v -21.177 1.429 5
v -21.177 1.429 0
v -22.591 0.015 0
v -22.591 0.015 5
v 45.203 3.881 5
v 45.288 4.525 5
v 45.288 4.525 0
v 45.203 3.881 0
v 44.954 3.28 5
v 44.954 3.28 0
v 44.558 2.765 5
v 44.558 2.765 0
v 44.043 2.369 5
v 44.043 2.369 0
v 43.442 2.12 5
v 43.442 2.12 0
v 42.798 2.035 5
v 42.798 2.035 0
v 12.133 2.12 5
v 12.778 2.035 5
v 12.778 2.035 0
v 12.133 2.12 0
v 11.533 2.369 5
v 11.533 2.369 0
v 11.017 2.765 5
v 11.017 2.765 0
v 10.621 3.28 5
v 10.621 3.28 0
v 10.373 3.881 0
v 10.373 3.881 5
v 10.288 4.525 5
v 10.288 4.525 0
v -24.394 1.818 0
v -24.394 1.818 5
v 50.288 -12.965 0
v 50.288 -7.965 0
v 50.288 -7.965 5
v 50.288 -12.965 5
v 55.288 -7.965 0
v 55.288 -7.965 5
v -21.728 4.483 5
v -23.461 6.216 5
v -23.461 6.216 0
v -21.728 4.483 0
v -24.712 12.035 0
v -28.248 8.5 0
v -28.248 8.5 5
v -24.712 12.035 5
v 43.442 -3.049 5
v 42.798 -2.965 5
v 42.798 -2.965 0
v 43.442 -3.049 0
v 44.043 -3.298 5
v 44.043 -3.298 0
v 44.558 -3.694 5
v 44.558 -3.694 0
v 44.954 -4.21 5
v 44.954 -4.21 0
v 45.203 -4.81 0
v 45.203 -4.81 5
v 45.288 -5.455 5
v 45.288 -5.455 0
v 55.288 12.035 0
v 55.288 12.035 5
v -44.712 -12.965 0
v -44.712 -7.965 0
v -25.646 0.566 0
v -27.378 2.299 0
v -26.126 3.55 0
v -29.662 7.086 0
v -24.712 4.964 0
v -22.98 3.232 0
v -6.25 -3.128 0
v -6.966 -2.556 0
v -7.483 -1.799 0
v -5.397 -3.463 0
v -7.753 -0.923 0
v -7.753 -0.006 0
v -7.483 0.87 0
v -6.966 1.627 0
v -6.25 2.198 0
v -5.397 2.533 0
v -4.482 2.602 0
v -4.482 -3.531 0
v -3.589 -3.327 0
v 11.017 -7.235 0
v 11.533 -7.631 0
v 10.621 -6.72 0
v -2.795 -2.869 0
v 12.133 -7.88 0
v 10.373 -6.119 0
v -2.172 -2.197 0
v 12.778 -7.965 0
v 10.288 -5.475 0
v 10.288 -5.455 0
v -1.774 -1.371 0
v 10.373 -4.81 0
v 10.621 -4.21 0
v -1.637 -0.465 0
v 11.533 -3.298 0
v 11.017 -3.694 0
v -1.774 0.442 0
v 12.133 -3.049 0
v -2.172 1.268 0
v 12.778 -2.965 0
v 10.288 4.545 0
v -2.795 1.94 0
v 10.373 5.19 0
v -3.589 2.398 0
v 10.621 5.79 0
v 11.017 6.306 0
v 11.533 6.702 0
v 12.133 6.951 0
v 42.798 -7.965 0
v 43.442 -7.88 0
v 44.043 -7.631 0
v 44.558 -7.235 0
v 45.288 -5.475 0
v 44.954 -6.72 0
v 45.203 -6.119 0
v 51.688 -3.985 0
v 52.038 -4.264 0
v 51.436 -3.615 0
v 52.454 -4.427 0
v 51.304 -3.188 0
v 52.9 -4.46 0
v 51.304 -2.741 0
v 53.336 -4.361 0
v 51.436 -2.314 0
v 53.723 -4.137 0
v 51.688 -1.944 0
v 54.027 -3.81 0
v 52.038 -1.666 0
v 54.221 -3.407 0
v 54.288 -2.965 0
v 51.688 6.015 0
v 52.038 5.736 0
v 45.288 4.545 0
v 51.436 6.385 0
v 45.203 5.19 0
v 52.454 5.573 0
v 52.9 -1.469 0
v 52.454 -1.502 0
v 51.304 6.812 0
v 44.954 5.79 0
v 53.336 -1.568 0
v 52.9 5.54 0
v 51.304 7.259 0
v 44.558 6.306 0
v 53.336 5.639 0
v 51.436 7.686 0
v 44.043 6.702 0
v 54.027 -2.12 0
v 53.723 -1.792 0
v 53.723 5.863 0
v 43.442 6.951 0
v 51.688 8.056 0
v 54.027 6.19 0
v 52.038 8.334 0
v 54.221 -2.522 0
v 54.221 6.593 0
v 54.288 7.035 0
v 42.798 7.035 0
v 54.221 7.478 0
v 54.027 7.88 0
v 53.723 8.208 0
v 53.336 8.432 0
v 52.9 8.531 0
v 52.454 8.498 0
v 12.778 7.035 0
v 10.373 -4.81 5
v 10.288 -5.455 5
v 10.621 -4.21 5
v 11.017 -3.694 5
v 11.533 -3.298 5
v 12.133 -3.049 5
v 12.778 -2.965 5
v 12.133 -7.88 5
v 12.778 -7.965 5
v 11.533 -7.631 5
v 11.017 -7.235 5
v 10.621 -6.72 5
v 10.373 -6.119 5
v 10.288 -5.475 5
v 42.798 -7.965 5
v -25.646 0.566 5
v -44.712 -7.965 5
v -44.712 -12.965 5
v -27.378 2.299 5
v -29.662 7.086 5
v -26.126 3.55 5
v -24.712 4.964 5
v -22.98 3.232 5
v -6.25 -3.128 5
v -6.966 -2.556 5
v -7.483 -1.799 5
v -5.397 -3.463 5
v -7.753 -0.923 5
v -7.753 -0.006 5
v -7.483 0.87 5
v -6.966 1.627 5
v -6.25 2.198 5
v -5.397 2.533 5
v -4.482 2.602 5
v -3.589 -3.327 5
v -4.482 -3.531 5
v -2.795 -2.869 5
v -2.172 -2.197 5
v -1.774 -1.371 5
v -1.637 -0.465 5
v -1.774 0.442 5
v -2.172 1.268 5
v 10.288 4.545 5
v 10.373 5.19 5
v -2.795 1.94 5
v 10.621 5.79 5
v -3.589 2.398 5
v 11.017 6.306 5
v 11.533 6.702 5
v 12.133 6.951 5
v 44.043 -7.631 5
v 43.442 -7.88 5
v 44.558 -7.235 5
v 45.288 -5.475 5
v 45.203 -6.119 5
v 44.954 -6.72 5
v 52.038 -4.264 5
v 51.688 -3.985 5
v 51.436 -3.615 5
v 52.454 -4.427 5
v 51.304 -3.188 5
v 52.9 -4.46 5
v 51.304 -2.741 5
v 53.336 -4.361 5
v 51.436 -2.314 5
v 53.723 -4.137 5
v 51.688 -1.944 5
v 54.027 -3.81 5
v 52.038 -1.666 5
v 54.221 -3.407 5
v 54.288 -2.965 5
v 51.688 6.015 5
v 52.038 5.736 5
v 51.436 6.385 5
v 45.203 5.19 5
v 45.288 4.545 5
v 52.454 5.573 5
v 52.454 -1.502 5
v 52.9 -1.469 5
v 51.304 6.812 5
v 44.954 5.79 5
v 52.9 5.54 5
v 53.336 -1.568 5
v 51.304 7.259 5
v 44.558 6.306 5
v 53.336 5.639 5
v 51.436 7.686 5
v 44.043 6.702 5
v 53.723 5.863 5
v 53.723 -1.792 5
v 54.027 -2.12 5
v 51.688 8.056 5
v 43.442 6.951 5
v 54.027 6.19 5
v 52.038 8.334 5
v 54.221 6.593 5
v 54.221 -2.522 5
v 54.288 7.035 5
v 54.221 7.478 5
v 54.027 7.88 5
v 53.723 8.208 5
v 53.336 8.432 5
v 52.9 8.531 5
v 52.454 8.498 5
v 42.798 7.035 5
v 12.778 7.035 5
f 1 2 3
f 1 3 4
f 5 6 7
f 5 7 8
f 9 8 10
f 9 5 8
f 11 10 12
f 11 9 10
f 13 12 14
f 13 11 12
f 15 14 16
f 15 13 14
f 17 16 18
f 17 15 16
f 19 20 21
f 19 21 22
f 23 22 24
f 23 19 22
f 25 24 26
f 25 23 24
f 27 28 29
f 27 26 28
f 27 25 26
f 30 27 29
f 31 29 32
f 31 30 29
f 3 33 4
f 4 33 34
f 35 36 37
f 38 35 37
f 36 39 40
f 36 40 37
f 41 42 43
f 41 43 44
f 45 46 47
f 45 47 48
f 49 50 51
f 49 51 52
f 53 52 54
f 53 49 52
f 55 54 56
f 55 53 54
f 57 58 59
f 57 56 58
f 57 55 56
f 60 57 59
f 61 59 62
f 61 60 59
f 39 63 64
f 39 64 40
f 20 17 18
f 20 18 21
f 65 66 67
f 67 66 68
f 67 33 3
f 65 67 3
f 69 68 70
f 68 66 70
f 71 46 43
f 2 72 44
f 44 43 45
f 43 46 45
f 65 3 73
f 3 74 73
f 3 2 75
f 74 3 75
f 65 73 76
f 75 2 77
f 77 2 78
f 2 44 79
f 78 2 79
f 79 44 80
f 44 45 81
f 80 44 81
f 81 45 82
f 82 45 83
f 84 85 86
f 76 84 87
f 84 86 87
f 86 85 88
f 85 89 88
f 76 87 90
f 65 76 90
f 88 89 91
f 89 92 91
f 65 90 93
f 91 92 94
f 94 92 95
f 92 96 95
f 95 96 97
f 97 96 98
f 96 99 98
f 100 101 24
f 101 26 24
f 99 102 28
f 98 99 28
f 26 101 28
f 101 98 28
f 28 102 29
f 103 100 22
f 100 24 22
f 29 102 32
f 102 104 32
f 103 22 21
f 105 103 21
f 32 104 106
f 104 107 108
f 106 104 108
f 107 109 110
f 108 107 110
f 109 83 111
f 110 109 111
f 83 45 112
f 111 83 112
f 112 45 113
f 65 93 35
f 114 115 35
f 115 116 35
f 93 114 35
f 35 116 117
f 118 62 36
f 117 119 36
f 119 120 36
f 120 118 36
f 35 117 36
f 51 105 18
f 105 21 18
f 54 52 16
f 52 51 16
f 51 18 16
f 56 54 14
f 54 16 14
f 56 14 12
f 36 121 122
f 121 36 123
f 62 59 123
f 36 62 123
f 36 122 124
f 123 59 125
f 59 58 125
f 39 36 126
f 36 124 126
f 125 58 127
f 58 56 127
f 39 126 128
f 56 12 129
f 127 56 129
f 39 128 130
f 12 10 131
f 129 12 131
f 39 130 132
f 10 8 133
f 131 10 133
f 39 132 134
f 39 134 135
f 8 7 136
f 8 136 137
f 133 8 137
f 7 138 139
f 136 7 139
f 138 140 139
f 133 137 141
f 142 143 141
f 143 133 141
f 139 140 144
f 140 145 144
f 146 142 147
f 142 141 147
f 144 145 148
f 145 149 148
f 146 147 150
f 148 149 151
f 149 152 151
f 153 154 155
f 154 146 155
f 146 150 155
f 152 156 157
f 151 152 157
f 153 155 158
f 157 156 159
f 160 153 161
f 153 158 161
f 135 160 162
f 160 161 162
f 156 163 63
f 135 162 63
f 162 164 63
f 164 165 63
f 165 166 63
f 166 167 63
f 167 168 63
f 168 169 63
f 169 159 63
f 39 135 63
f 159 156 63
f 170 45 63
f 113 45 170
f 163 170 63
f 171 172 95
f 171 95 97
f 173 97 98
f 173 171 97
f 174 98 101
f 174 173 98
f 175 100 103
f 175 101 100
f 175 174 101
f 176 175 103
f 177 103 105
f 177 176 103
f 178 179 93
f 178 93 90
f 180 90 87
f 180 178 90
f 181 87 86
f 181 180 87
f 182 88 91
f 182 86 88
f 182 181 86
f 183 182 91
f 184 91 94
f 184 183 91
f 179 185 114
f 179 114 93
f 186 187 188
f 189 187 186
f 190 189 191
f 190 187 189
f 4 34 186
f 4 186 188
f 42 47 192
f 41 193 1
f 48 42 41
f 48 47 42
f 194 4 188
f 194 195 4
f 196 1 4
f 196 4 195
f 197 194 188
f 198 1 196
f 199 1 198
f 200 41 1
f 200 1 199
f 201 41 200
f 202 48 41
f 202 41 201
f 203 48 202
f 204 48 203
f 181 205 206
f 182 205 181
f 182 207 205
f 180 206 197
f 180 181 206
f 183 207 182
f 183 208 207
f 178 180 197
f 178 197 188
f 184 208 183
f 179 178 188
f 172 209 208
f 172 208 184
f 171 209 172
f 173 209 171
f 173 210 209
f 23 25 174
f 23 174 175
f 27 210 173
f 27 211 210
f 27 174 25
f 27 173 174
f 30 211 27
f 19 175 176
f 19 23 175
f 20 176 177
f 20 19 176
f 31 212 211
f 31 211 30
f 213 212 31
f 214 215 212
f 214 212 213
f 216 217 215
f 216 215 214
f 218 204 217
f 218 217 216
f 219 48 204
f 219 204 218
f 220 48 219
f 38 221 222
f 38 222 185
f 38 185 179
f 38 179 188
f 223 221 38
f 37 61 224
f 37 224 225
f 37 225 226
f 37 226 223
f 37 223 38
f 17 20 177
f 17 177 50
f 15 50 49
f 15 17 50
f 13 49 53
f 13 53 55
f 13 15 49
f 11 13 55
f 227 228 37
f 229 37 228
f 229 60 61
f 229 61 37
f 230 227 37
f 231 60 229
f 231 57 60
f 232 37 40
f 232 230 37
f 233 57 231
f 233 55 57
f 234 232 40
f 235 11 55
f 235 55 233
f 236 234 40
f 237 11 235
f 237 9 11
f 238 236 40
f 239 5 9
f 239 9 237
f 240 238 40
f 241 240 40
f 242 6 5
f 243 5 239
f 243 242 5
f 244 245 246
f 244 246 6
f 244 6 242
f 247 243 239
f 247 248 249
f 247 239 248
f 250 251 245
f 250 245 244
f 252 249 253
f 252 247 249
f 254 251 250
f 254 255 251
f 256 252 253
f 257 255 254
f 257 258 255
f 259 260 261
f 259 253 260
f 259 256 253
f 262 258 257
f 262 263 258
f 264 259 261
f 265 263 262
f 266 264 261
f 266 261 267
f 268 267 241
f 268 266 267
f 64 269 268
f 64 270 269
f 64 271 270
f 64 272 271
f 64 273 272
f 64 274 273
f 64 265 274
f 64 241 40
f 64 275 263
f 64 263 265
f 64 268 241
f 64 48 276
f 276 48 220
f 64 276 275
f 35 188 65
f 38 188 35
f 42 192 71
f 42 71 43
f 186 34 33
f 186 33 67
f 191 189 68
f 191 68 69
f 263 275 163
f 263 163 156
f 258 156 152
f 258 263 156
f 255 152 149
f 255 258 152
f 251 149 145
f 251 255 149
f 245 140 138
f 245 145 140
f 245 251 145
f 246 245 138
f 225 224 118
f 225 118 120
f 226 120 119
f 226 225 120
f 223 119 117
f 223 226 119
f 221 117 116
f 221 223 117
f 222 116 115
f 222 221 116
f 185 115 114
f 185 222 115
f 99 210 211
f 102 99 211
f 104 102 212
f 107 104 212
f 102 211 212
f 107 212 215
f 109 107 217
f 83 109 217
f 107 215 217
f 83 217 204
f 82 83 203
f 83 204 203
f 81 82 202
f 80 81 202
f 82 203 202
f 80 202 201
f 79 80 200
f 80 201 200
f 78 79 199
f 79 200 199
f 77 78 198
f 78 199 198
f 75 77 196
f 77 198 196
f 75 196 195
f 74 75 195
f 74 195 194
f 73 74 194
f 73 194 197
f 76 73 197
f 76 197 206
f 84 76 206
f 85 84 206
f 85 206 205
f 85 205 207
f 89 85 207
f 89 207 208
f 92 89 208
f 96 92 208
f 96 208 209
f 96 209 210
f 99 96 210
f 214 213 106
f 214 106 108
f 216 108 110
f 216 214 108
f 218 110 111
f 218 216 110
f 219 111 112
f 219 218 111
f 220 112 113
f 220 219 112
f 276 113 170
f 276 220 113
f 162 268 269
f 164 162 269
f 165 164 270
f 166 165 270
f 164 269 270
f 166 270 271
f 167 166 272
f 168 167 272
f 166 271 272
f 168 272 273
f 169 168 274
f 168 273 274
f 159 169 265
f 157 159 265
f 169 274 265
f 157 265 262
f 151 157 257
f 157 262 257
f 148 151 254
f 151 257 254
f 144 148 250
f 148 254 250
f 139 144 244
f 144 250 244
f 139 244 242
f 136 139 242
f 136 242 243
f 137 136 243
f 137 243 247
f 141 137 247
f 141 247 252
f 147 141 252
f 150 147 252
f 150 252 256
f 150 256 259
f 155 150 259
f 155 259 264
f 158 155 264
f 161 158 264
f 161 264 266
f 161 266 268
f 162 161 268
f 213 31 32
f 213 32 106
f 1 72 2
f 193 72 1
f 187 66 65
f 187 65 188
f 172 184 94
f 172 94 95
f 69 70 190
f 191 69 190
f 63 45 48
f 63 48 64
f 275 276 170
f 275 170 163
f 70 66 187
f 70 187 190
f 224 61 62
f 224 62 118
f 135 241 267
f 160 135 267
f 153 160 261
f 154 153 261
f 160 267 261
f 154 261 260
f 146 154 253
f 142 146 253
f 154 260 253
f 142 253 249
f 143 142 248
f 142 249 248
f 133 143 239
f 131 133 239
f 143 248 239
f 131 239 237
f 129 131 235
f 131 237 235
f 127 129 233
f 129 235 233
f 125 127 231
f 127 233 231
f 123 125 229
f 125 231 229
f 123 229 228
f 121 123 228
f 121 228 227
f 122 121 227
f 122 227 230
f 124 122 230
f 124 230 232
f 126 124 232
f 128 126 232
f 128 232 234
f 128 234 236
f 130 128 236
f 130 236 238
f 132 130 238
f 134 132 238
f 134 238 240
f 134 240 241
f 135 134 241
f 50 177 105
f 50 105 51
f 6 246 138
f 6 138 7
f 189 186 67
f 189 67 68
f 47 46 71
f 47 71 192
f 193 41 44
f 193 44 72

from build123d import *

# Parameters (mm, degrees)
RESSALTO_EXTRUS_O1_DEPTH = 5
ESBO_O2_W                = 95
ESBO_O2_H                = 5
RESSALTO_EXTRUS_O2_DEPTH = 5
ESBO_O5_W                = 5
ESBO_O5_H                = 2
CORTE_EXTRUS_O1_DEPTH    = 10
CORTE_EXTRUS_O2_DEPTH    = 10
ESBO_O8_R                = 3.075
CORTE_EXTRUS_O3_DEPTH    = 6
CORTE_EXTRUS_O4_DEPTH    = 10
ESBO_O10_R               = 1.5
CORTE_EXTRUS_O5_DEPTH    = 10


with BuildPart() as part:
    # Esboço1 → Ressalto-extrusão1 (new body)
    with BuildSketch(Plane.XY):
        Polygon((-44.712278576, -7.96460177), (-24.712278576, 12.03539823), (55.287721424, 12.03539823), (55.287721424, -7.96460177), align=None)
    extrude(amount=RESSALTO_EXTRUS_O1_DEPTH)

    # Esboço2 → Ressalto-extrusão2 (add)
    with BuildSketch(Plane.XZ.offset(7.96460177)):
        with Locations((2.787721424, 2.5)):
            Rectangle(ESBO_O2_W, ESBO_O2_H)
    extrude(amount=RESSALTO_EXTRUS_O2_DEPTH)

    # Esboço5 → Corte-extrusão1 (cut)
    with BuildSketch(Plane(origin=(-18.373838403, 18.373838403, 0), x_dir=(0, 0, 1), z_dir=(-0.707106781, 0.707106781, 0))):
        with Locations((2.5, -14.963908057)):
            Rectangle(ESBO_O5_W, ESBO_O5_H)
    extrude(amount=-CORTE_EXTRUS_O1_DEPTH, mode=Mode.SUBTRACT)

    # Esboço7 → Corte-extrusão2 (cut)
    with BuildSketch(Plane.XY.offset(5)):
        Polygon((-24.712278576, 4.964330418), (-23.460699574, 6.215909421), (-21.72828796, 4.483497807), (-22.979866962, 3.231918804), align=None)
        Polygon((-24.394080525, 1.817705242), (-25.645659528, 0.566126239), (-27.378071141, 2.298537853), (-26.126492139, 3.550116856), align=None)
    extrude(amount=-CORTE_EXTRUS_O2_DEPTH, mode=Mode.SUBTRACT)

    # Esboço8 → Corte-extrusão3 (cut, through all)
    with BuildSketch(Plane.XY.offset(5)):
        with Locations((-4.712278576, -0.46460177)):
            Circle(ESBO_O8_R)
    extrude(amount=-CORTE_EXTRUS_O3_DEPTH, mode=Mode.SUBTRACT)

    # Esboço9 → Corte-extrusão4 (cut)
    with BuildSketch(Plane.XY.offset(5)):
        with BuildLine():
            Line((12.777721424, 7.03539823), (42.797721424, 7.03539823))
            ThreePointArc((42.797721424, 7.03539823), (44.558417309, 6.306094115), (45.287721424, 4.54539823))
            Line((45.287721424, 4.54539823), (45.287721424, 4.52539823))
            ThreePointArc((45.287721424, 4.52539823), (44.558417309, 2.764702345), (42.797721424, 2.03539823))
            Line((42.797721424, 2.03539823), (12.777721424, 2.03539823))
            ThreePointArc((12.777721424, 2.03539823), (11.017025538, 2.764702345), (10.287721424, 4.52539823))
            Line((10.287721424, 4.52539823), (10.287721424, 4.54539823))
            ThreePointArc((10.287721424, 4.54539823), (11.017025538, 6.306094115), (12.777721424, 7.03539823))
        make_face()
        with BuildLine():
            Line((12.777721424, -2.96460177), (42.797721424, -2.96460177))
            ThreePointArc((42.797721424, -2.96460177), (44.558417309, -3.693905885), (45.287721424, -5.45460177))
            Line((45.287721424, -5.45460177), (45.287721424, -5.47460177))
            ThreePointArc((45.287721424, -5.47460177), (44.558417309, -7.235297655), (42.797721424, -7.96460177))
            Line((42.797721424, -7.96460177), (12.777721424, -7.96460177))
            ThreePointArc((12.777721424, -7.96460177), (11.017025538, -7.235297655), (10.287721424, -5.47460177))
            Line((10.287721424, -5.47460177), (10.287721424, -5.45460177))
            ThreePointArc((10.287721424, -5.45460177), (11.017025538, -3.693905885), (12.777721424, -2.96460177))
        make_face()
    extrude(amount=-CORTE_EXTRUS_O4_DEPTH, mode=Mode.SUBTRACT)

    # Esboço10 → Corte-extrusão5 (cut)
    with BuildSketch(Plane.XY.offset(5)):
        with Locations((52.787721424, 7.03539823)):
            Circle(ESBO_O10_R)
        with Locations((52.787721424, -2.96460177)):
            Circle(ESBO_O10_R)
    extrude(amount=-CORTE_EXTRUS_O5_DEPTH, mode=Mode.SUBTRACT)


solid = part.part
